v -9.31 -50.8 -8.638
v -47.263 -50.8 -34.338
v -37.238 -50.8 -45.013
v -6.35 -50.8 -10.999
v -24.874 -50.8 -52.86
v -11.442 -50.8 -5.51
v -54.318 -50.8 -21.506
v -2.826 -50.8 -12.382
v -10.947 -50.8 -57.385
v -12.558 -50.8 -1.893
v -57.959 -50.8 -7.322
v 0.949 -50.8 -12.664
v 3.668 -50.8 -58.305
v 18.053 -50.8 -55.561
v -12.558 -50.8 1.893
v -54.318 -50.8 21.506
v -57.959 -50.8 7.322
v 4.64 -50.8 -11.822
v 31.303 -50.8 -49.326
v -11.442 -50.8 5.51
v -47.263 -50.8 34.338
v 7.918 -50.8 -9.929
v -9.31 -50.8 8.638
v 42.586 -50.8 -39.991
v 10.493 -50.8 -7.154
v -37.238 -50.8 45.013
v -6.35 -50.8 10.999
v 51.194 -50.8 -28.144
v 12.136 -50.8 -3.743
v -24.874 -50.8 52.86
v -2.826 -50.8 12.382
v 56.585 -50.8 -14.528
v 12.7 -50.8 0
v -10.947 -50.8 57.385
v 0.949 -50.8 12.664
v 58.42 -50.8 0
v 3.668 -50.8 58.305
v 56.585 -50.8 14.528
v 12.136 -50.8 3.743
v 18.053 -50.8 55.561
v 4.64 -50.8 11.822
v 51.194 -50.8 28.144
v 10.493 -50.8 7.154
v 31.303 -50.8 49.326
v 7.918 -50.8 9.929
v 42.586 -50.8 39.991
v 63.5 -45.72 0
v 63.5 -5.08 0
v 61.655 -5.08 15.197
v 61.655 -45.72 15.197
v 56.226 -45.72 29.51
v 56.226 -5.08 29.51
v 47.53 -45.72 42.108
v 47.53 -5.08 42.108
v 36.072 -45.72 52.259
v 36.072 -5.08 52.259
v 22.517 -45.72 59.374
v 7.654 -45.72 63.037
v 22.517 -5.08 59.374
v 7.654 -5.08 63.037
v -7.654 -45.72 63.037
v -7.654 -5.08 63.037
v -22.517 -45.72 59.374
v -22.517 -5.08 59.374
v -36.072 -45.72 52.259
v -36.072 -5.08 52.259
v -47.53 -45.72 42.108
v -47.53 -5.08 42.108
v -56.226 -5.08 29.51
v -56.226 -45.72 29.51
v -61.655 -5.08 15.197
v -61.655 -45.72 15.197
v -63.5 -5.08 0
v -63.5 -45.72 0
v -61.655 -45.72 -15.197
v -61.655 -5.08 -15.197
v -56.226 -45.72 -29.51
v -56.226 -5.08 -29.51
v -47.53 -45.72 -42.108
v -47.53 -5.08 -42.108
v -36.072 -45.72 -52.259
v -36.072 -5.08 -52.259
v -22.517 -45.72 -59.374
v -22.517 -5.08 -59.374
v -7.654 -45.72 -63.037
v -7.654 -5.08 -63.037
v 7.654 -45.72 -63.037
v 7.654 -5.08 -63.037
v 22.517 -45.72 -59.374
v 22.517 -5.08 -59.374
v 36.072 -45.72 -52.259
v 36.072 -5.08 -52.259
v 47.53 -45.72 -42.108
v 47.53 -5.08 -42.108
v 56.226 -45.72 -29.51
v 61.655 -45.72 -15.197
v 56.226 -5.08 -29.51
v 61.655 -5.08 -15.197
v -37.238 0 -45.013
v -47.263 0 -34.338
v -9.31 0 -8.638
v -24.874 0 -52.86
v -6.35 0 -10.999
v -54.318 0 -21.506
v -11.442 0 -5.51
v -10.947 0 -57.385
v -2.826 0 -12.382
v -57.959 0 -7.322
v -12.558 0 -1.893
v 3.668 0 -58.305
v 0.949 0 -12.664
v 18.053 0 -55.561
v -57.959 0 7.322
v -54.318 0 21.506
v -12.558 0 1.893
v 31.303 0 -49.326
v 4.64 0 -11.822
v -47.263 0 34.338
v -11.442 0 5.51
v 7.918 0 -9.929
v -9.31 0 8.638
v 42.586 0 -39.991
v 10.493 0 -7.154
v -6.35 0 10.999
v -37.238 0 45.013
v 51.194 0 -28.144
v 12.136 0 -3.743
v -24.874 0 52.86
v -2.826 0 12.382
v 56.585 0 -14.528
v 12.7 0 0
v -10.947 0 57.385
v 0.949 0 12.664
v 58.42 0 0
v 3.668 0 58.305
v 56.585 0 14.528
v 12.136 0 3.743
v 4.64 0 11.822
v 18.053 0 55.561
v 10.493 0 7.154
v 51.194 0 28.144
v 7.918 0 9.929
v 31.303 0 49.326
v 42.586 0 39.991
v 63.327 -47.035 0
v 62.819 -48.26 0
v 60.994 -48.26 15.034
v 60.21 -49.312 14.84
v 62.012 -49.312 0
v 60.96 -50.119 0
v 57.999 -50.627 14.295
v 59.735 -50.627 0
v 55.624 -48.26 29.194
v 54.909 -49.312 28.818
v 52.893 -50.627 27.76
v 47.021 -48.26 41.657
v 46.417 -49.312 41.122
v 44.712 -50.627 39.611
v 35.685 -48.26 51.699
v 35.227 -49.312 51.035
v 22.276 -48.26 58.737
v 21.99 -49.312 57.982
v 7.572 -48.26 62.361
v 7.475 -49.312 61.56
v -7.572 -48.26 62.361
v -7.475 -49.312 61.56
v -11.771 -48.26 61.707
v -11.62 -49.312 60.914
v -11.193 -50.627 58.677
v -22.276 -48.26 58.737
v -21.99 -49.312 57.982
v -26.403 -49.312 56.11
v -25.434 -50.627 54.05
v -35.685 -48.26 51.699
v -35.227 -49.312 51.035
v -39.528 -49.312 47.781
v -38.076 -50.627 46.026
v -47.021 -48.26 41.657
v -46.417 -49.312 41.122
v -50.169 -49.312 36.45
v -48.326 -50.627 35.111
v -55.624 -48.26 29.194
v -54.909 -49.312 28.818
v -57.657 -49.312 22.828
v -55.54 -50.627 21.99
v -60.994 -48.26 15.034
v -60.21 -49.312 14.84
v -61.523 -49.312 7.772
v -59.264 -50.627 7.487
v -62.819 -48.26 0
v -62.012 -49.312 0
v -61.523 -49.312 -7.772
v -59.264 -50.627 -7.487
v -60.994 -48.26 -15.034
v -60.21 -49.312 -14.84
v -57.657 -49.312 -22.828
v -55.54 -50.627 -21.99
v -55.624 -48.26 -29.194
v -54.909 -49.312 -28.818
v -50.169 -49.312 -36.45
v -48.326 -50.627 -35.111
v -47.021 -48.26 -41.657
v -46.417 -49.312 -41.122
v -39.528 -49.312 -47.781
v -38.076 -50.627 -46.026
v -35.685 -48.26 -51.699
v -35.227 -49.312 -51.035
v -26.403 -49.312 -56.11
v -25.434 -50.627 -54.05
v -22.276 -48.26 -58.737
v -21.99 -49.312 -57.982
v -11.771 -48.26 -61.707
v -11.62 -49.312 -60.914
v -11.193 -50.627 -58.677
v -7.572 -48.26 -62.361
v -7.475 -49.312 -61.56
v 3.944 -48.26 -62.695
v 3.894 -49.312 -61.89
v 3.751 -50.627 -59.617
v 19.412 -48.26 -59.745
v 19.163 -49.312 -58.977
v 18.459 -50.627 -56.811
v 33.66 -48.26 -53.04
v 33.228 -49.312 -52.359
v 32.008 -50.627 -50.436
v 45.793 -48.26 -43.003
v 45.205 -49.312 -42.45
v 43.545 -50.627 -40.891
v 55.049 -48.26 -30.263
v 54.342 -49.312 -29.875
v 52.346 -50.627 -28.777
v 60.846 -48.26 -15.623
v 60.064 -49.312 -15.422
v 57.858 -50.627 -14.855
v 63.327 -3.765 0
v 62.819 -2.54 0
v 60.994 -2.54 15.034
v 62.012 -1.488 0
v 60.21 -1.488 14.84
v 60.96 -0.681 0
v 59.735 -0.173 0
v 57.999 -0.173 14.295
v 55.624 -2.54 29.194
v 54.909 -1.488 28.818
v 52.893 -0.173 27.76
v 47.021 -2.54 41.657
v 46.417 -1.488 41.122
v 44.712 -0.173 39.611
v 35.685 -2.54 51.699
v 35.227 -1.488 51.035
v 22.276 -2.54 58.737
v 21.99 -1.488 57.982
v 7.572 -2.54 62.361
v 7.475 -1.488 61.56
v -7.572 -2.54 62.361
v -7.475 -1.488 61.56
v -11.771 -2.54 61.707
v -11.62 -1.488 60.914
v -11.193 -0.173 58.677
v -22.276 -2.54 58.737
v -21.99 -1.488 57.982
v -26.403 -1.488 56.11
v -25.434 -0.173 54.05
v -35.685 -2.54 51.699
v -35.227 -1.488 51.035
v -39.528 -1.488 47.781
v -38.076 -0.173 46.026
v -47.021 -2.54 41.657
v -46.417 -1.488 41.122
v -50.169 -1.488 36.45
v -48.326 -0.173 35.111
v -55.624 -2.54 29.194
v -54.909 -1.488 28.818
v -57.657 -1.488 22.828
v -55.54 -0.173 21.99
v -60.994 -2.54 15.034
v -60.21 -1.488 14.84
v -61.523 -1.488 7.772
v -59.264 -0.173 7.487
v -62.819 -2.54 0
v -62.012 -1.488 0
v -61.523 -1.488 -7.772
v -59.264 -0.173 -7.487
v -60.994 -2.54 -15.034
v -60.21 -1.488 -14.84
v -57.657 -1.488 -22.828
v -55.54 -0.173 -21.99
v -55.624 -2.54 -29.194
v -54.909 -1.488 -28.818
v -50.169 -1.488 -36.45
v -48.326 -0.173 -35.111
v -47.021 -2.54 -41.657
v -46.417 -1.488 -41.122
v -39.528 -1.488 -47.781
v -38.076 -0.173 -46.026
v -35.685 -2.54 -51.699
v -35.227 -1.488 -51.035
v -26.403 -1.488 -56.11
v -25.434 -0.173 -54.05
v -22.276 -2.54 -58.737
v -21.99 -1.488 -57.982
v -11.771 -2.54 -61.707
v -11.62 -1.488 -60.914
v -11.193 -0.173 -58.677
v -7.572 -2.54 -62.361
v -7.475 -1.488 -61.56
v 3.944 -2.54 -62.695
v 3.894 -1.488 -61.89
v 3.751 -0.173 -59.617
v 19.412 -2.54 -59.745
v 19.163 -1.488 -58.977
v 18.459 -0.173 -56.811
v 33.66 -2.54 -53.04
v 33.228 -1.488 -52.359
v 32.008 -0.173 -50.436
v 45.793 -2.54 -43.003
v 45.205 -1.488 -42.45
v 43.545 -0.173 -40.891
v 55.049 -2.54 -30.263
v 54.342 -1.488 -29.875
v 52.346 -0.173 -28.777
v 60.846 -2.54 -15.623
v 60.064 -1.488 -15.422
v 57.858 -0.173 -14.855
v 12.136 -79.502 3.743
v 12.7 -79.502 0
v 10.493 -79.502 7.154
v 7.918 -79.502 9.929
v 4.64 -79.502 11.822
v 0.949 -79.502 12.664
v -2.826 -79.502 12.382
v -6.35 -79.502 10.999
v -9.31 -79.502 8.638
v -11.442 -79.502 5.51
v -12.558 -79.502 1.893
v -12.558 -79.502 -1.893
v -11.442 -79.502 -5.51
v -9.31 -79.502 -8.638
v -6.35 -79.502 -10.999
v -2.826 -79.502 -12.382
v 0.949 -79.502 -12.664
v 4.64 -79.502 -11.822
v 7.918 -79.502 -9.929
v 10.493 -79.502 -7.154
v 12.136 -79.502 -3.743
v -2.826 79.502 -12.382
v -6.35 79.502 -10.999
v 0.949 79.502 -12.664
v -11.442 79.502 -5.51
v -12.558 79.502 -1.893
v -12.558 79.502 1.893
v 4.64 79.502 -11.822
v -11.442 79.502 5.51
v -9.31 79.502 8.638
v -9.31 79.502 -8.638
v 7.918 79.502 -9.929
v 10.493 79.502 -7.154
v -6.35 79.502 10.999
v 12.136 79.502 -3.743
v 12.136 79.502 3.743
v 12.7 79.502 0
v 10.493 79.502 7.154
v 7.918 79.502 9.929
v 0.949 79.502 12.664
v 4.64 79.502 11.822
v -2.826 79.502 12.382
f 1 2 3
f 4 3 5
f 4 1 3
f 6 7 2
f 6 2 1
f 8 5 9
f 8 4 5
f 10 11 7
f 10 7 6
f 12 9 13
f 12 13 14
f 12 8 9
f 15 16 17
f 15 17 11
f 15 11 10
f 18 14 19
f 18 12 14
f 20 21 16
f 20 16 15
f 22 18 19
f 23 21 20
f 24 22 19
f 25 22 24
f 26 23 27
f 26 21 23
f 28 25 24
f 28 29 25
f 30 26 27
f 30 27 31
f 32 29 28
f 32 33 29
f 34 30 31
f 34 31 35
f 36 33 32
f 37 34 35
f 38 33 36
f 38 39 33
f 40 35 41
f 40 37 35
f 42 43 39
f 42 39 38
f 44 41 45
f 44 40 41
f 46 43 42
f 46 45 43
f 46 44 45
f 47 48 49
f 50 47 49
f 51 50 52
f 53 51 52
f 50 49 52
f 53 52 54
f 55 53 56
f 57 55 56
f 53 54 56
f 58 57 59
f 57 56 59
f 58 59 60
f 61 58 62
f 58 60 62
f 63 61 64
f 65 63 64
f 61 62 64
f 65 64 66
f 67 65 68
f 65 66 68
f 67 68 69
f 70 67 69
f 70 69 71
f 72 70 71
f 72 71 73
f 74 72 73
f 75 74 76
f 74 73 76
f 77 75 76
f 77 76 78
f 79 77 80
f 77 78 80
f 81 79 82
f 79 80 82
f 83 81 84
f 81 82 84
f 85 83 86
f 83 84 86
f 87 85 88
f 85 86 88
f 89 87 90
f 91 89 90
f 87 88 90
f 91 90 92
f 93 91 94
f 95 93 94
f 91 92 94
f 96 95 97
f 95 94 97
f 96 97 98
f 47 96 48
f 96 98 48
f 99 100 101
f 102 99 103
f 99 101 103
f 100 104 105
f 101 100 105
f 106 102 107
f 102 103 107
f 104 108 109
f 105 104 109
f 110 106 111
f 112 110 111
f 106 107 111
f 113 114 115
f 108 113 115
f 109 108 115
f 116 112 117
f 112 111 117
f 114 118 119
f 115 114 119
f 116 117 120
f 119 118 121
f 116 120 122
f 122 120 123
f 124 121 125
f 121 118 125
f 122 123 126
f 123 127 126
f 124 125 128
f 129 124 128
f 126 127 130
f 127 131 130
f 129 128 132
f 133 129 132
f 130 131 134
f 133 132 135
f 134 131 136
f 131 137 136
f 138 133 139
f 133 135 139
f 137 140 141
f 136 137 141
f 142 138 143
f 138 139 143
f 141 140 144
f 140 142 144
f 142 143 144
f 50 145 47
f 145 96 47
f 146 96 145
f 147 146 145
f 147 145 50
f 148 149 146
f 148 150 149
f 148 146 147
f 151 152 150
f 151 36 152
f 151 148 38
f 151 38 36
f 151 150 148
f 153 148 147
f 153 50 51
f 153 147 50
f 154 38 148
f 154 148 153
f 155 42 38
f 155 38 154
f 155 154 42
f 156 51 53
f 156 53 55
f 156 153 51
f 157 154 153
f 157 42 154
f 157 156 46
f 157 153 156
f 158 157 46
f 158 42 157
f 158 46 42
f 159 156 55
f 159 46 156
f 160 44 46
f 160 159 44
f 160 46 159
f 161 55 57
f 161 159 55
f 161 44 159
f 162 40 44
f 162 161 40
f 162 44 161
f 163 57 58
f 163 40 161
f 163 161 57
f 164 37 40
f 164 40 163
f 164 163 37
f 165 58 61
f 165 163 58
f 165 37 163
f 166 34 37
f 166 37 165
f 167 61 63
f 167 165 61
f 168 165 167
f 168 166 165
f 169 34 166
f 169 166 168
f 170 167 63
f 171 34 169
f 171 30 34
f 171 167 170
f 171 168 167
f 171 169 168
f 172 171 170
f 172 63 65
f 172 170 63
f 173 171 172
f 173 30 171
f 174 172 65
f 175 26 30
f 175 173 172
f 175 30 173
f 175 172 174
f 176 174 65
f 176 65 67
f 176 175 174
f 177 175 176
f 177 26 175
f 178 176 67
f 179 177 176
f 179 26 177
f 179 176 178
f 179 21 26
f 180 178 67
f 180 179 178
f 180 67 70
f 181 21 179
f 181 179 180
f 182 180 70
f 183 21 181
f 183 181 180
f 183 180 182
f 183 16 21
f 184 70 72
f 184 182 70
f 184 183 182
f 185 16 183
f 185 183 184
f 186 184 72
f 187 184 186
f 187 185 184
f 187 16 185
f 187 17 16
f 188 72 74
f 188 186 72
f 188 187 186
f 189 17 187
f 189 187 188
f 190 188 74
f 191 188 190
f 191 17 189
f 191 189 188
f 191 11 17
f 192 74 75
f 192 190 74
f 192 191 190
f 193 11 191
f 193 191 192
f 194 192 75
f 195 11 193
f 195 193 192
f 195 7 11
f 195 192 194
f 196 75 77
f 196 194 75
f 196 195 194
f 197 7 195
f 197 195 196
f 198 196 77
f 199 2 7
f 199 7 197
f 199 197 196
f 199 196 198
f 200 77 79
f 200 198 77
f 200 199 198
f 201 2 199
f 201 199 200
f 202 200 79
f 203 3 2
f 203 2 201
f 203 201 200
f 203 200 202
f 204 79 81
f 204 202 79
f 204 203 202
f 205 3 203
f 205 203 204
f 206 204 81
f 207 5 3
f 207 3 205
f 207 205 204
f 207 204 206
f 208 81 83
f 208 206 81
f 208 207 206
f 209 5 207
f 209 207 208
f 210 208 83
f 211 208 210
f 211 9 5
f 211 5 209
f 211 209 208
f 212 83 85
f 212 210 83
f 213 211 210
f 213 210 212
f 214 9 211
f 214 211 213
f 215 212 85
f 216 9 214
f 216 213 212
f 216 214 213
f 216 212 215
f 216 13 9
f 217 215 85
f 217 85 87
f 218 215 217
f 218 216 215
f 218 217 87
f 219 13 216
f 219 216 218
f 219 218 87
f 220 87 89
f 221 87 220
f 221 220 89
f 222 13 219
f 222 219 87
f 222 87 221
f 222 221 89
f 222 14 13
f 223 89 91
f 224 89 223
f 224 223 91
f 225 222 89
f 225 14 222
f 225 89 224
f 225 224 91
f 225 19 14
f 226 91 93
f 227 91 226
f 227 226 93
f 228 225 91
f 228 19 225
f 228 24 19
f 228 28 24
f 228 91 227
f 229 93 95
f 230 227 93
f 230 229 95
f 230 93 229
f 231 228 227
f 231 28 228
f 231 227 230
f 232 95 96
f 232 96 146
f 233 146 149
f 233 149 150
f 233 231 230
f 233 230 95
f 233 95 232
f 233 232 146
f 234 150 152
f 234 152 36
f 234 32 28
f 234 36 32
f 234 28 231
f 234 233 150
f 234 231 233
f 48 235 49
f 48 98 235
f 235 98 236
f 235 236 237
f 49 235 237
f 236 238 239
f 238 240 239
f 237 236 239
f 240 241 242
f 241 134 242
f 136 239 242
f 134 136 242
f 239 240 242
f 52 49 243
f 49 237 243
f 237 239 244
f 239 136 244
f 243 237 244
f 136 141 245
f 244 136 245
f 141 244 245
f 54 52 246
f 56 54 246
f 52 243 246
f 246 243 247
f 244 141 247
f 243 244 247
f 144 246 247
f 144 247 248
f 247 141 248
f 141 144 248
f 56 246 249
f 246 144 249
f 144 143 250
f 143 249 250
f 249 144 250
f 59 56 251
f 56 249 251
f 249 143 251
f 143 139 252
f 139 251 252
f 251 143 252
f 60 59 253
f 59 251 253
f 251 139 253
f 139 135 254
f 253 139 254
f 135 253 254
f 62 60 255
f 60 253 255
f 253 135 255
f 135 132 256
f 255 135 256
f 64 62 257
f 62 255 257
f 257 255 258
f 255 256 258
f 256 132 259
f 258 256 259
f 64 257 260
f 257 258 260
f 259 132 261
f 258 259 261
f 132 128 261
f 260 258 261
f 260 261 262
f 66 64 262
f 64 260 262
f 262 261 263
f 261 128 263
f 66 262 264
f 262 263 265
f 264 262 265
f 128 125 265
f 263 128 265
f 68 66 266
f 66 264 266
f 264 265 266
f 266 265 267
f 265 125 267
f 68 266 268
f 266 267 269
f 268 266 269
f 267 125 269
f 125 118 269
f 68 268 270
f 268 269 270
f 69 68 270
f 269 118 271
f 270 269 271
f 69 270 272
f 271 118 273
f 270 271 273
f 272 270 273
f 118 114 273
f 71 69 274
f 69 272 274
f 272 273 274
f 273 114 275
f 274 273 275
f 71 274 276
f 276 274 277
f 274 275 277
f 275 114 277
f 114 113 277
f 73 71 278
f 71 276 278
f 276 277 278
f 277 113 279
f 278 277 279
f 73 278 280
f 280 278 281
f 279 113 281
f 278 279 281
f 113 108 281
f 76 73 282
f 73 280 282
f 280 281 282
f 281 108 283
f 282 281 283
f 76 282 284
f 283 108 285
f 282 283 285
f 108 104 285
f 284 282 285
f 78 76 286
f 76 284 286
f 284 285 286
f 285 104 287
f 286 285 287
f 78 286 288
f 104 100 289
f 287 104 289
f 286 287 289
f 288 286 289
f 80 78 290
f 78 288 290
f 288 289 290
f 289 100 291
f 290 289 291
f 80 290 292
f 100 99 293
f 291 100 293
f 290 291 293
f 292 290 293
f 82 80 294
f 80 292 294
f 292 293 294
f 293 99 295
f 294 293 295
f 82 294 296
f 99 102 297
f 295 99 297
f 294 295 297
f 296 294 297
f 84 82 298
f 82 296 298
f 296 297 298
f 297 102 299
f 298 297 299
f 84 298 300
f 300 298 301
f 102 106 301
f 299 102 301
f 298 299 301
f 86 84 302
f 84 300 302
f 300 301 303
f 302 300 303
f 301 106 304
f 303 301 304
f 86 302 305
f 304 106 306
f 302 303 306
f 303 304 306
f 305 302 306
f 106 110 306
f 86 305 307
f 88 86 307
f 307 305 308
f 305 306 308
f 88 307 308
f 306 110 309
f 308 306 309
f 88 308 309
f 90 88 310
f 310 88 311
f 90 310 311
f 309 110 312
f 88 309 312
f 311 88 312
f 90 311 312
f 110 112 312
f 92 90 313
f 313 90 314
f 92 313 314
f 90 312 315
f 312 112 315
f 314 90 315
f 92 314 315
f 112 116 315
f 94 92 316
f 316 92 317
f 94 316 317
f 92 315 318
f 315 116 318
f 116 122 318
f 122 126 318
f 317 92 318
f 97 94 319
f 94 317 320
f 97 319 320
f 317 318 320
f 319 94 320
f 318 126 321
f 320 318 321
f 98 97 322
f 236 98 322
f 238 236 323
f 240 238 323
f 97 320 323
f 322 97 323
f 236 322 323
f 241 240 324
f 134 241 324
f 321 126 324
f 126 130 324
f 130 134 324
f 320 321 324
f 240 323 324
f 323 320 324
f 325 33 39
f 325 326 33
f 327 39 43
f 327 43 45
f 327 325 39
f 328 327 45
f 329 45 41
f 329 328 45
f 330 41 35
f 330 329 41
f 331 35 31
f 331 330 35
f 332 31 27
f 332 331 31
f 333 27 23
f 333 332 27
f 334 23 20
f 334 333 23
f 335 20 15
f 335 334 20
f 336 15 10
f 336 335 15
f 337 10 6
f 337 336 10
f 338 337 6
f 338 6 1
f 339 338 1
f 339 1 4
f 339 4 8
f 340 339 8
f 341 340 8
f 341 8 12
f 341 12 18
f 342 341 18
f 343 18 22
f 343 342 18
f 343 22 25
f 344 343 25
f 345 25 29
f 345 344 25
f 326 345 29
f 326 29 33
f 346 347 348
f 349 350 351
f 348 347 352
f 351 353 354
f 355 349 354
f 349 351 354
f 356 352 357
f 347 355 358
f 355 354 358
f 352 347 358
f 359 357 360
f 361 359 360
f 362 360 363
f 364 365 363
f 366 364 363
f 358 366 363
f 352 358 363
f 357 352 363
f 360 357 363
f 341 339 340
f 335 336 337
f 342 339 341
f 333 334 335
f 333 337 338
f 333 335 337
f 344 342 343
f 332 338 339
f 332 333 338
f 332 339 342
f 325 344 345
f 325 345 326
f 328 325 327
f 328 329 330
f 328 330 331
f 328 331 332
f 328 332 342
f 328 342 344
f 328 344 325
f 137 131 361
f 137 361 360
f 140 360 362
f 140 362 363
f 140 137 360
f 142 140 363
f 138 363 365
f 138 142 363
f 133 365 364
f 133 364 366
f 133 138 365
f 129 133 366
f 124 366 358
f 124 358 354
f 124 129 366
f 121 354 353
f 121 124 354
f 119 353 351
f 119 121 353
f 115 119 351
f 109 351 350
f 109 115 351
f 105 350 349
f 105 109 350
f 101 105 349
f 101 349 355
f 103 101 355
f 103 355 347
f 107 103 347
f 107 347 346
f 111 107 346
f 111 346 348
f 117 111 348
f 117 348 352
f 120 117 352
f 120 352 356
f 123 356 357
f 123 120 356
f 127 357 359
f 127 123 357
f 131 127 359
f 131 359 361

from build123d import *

# Parameters (mm, degrees)
F0_R     = 63.5
F2_DEPTH = 50.8
F1_R     = 12.7
F3_DEPTH = 50.8
F4_R     = 12.7
F5_DEPTH = 79.50153
F6_R     = 5.08
F7_R     = 5.08


with BuildPart() as f2:
    # F0 (on Front) → F2 (new body)
    with BuildSketch(Plane.XZ):
        Circle(F0_R)
    extrude(amount=F2_DEPTH)

    # F1 (on face) → F3 (cut)
    with BuildSketch(Plane.XZ):
        Circle(F1_R)
    extrude(amount=F3_DEPTH, mode=Mode.SUBTRACT)

    # F4 (on Front) → F5 (join, symmetric)
    with BuildSketch(Plane.XZ):
        Circle(F4_R)
    extrude(amount=F5_DEPTH, both=True)

    # F6
    f6_edges = [f2.edges().sort_by_distance(p)[0] for p in [
        (-63.5, -50.8, 0),
    ]]
    fillet(f6_edges, radius=F6_R)

    # F7
    f7_edges = [f2.edges().sort_by_distance(p)[0] for p in [
        (-63.5, 0, 0),
    ]]
    fillet(f7_edges, radius=F7_R)


solid = f2.part
